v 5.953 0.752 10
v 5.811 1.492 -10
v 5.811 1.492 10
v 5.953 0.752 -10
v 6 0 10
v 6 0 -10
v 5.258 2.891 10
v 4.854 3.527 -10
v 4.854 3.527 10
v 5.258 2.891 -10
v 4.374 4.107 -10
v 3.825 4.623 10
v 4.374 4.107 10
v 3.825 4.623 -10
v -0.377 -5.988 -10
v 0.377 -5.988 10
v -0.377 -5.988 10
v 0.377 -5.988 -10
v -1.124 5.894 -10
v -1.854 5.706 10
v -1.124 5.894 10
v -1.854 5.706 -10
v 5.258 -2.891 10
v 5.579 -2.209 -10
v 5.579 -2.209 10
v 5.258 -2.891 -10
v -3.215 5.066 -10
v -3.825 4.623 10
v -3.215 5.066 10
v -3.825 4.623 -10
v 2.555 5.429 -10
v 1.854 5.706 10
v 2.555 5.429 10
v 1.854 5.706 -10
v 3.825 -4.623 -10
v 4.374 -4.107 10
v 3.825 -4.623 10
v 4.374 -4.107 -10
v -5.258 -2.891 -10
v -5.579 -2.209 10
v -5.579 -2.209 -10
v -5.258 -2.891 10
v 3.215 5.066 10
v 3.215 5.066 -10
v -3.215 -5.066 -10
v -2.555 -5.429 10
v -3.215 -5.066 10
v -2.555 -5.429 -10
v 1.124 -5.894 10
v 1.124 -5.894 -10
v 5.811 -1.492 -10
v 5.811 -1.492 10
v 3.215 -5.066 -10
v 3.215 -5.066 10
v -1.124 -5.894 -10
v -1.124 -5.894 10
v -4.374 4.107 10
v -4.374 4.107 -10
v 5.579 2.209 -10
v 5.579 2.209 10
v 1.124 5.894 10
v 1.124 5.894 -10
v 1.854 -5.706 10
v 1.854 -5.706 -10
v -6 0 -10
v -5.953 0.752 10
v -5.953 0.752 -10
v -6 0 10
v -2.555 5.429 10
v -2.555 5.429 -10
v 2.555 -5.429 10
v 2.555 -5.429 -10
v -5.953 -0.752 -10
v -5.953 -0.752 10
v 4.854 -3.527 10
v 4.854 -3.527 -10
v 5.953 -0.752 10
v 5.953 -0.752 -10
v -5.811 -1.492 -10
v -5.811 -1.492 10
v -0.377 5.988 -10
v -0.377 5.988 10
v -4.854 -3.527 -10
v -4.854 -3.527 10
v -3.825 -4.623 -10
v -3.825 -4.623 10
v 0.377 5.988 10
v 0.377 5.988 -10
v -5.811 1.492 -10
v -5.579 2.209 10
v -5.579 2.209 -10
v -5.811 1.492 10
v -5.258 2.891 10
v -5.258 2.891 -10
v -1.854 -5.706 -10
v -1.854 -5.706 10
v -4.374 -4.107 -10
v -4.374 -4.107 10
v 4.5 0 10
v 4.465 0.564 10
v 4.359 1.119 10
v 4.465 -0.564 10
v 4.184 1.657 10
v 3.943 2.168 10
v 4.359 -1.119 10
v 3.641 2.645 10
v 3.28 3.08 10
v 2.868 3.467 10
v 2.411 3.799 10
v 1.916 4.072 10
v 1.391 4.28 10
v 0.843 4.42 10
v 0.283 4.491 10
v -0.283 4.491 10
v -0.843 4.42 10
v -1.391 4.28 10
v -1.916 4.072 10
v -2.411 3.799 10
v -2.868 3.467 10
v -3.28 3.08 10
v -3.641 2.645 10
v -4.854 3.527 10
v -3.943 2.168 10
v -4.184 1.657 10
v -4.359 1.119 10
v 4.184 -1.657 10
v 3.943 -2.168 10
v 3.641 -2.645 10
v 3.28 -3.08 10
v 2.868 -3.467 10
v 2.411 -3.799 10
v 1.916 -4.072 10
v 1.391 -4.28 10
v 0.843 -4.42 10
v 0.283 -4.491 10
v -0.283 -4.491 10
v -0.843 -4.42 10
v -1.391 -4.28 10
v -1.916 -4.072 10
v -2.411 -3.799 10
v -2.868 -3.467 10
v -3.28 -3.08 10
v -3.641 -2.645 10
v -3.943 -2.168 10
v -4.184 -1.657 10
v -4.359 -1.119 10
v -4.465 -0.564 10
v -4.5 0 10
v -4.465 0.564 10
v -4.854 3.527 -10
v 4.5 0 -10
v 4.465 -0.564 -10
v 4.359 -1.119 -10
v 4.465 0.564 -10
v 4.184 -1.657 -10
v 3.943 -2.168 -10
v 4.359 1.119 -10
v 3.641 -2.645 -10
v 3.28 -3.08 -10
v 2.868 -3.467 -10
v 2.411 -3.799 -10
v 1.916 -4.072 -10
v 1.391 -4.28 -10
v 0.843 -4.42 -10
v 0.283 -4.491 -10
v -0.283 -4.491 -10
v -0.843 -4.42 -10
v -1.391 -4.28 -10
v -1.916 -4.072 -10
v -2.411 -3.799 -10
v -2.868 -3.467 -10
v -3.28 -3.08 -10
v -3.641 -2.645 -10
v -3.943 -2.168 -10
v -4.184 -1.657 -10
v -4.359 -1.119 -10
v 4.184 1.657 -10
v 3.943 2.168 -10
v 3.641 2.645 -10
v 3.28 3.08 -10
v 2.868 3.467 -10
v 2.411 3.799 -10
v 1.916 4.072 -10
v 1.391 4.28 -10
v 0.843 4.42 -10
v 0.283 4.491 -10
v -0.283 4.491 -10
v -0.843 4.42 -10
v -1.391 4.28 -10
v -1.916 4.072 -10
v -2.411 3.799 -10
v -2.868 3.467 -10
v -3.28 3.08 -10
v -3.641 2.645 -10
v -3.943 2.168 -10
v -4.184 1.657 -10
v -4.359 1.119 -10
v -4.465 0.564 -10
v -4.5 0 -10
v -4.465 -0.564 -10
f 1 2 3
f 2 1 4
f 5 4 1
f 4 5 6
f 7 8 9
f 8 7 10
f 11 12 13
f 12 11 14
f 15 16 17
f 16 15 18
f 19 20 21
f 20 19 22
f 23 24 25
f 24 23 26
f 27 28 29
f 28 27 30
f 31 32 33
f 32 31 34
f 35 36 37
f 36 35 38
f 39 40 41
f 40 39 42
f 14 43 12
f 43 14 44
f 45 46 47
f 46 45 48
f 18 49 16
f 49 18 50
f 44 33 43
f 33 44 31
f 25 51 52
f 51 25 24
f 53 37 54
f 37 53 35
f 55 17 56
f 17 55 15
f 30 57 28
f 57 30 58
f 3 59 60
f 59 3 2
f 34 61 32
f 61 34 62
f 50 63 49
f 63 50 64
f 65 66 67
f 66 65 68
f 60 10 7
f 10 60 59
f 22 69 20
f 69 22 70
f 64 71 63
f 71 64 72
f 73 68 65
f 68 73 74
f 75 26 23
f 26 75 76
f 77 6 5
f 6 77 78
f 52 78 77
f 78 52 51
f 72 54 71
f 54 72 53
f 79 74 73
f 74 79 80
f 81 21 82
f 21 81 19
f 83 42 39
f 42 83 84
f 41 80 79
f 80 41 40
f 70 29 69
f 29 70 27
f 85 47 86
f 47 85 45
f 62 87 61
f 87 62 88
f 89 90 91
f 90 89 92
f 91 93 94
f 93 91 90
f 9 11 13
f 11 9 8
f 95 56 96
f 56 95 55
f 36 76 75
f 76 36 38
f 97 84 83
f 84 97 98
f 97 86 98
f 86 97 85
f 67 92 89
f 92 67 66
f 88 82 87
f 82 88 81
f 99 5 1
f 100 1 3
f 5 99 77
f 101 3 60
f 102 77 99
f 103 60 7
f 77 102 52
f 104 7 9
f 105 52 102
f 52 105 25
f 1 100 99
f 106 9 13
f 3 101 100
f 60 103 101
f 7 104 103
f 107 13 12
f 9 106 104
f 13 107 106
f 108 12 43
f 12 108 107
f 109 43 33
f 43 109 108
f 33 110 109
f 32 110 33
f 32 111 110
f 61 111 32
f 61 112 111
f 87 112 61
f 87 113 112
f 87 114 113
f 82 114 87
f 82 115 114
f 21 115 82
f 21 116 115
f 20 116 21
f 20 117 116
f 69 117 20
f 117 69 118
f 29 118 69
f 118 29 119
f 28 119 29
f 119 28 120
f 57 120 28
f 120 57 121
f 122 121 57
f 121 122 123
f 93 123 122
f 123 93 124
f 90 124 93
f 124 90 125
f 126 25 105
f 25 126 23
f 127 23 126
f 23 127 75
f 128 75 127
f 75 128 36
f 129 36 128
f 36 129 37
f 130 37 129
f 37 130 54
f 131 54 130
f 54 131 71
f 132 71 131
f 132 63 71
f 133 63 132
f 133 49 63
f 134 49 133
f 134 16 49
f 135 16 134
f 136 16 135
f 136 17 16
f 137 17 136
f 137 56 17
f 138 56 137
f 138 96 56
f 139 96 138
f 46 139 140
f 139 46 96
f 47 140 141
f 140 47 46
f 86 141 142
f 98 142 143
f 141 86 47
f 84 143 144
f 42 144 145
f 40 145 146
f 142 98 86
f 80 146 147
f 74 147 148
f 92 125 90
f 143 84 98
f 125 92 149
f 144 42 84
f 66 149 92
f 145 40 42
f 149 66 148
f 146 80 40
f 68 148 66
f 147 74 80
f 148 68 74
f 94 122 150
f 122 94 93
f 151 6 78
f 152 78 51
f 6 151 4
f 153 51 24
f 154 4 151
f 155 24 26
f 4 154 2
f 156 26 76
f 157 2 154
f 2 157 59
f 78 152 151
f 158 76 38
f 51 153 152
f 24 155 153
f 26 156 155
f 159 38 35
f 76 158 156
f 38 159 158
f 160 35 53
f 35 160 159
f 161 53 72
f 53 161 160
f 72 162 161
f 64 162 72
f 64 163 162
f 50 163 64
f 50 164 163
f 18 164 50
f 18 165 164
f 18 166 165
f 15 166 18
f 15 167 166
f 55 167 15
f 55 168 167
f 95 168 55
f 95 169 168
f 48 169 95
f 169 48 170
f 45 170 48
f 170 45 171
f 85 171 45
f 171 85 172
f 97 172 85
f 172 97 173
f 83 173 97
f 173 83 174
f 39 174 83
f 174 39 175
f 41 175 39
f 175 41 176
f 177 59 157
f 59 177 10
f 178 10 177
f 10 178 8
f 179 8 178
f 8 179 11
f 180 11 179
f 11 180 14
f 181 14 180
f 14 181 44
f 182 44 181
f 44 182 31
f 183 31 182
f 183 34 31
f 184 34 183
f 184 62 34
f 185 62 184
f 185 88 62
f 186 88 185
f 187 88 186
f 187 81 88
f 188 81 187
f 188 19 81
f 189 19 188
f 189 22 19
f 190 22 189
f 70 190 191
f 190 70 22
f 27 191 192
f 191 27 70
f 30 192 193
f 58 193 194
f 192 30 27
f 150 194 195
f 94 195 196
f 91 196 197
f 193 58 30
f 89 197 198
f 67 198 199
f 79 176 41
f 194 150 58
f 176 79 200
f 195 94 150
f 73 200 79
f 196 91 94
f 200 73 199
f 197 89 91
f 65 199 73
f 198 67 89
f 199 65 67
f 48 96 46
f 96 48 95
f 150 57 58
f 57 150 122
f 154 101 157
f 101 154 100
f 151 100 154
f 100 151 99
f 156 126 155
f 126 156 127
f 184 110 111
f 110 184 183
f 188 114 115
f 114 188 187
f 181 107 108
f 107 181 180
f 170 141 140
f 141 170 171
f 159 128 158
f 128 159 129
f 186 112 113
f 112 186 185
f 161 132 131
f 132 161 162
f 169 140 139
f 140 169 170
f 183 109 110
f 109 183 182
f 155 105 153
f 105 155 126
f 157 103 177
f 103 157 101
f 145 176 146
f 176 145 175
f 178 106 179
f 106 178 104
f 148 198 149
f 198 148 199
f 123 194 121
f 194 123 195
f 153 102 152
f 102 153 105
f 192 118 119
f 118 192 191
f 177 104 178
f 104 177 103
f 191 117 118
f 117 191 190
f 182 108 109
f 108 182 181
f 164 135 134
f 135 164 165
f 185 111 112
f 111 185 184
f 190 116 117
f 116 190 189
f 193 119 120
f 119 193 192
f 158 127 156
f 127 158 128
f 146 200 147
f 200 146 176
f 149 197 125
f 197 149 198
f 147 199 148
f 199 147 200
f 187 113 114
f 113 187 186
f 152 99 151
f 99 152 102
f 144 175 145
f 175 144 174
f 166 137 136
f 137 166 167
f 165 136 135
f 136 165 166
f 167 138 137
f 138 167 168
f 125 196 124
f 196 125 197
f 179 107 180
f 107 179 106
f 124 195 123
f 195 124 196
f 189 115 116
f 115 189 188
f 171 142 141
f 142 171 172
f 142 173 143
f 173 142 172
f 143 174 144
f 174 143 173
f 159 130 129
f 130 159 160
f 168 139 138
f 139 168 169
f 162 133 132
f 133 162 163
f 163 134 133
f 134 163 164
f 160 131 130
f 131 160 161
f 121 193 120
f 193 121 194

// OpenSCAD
$fn = 50;


difference() {
	union() {
		translate(v = [0, 0, -10.0000000000]) {
			cylinder(h = 20, r = 6.0000000000);
		}
	}
	union() {
		translate(v = [0, 0, -100.0000000000]) {
			cylinder(h = 200, r = 4.5000000000);
		}
	}
}
